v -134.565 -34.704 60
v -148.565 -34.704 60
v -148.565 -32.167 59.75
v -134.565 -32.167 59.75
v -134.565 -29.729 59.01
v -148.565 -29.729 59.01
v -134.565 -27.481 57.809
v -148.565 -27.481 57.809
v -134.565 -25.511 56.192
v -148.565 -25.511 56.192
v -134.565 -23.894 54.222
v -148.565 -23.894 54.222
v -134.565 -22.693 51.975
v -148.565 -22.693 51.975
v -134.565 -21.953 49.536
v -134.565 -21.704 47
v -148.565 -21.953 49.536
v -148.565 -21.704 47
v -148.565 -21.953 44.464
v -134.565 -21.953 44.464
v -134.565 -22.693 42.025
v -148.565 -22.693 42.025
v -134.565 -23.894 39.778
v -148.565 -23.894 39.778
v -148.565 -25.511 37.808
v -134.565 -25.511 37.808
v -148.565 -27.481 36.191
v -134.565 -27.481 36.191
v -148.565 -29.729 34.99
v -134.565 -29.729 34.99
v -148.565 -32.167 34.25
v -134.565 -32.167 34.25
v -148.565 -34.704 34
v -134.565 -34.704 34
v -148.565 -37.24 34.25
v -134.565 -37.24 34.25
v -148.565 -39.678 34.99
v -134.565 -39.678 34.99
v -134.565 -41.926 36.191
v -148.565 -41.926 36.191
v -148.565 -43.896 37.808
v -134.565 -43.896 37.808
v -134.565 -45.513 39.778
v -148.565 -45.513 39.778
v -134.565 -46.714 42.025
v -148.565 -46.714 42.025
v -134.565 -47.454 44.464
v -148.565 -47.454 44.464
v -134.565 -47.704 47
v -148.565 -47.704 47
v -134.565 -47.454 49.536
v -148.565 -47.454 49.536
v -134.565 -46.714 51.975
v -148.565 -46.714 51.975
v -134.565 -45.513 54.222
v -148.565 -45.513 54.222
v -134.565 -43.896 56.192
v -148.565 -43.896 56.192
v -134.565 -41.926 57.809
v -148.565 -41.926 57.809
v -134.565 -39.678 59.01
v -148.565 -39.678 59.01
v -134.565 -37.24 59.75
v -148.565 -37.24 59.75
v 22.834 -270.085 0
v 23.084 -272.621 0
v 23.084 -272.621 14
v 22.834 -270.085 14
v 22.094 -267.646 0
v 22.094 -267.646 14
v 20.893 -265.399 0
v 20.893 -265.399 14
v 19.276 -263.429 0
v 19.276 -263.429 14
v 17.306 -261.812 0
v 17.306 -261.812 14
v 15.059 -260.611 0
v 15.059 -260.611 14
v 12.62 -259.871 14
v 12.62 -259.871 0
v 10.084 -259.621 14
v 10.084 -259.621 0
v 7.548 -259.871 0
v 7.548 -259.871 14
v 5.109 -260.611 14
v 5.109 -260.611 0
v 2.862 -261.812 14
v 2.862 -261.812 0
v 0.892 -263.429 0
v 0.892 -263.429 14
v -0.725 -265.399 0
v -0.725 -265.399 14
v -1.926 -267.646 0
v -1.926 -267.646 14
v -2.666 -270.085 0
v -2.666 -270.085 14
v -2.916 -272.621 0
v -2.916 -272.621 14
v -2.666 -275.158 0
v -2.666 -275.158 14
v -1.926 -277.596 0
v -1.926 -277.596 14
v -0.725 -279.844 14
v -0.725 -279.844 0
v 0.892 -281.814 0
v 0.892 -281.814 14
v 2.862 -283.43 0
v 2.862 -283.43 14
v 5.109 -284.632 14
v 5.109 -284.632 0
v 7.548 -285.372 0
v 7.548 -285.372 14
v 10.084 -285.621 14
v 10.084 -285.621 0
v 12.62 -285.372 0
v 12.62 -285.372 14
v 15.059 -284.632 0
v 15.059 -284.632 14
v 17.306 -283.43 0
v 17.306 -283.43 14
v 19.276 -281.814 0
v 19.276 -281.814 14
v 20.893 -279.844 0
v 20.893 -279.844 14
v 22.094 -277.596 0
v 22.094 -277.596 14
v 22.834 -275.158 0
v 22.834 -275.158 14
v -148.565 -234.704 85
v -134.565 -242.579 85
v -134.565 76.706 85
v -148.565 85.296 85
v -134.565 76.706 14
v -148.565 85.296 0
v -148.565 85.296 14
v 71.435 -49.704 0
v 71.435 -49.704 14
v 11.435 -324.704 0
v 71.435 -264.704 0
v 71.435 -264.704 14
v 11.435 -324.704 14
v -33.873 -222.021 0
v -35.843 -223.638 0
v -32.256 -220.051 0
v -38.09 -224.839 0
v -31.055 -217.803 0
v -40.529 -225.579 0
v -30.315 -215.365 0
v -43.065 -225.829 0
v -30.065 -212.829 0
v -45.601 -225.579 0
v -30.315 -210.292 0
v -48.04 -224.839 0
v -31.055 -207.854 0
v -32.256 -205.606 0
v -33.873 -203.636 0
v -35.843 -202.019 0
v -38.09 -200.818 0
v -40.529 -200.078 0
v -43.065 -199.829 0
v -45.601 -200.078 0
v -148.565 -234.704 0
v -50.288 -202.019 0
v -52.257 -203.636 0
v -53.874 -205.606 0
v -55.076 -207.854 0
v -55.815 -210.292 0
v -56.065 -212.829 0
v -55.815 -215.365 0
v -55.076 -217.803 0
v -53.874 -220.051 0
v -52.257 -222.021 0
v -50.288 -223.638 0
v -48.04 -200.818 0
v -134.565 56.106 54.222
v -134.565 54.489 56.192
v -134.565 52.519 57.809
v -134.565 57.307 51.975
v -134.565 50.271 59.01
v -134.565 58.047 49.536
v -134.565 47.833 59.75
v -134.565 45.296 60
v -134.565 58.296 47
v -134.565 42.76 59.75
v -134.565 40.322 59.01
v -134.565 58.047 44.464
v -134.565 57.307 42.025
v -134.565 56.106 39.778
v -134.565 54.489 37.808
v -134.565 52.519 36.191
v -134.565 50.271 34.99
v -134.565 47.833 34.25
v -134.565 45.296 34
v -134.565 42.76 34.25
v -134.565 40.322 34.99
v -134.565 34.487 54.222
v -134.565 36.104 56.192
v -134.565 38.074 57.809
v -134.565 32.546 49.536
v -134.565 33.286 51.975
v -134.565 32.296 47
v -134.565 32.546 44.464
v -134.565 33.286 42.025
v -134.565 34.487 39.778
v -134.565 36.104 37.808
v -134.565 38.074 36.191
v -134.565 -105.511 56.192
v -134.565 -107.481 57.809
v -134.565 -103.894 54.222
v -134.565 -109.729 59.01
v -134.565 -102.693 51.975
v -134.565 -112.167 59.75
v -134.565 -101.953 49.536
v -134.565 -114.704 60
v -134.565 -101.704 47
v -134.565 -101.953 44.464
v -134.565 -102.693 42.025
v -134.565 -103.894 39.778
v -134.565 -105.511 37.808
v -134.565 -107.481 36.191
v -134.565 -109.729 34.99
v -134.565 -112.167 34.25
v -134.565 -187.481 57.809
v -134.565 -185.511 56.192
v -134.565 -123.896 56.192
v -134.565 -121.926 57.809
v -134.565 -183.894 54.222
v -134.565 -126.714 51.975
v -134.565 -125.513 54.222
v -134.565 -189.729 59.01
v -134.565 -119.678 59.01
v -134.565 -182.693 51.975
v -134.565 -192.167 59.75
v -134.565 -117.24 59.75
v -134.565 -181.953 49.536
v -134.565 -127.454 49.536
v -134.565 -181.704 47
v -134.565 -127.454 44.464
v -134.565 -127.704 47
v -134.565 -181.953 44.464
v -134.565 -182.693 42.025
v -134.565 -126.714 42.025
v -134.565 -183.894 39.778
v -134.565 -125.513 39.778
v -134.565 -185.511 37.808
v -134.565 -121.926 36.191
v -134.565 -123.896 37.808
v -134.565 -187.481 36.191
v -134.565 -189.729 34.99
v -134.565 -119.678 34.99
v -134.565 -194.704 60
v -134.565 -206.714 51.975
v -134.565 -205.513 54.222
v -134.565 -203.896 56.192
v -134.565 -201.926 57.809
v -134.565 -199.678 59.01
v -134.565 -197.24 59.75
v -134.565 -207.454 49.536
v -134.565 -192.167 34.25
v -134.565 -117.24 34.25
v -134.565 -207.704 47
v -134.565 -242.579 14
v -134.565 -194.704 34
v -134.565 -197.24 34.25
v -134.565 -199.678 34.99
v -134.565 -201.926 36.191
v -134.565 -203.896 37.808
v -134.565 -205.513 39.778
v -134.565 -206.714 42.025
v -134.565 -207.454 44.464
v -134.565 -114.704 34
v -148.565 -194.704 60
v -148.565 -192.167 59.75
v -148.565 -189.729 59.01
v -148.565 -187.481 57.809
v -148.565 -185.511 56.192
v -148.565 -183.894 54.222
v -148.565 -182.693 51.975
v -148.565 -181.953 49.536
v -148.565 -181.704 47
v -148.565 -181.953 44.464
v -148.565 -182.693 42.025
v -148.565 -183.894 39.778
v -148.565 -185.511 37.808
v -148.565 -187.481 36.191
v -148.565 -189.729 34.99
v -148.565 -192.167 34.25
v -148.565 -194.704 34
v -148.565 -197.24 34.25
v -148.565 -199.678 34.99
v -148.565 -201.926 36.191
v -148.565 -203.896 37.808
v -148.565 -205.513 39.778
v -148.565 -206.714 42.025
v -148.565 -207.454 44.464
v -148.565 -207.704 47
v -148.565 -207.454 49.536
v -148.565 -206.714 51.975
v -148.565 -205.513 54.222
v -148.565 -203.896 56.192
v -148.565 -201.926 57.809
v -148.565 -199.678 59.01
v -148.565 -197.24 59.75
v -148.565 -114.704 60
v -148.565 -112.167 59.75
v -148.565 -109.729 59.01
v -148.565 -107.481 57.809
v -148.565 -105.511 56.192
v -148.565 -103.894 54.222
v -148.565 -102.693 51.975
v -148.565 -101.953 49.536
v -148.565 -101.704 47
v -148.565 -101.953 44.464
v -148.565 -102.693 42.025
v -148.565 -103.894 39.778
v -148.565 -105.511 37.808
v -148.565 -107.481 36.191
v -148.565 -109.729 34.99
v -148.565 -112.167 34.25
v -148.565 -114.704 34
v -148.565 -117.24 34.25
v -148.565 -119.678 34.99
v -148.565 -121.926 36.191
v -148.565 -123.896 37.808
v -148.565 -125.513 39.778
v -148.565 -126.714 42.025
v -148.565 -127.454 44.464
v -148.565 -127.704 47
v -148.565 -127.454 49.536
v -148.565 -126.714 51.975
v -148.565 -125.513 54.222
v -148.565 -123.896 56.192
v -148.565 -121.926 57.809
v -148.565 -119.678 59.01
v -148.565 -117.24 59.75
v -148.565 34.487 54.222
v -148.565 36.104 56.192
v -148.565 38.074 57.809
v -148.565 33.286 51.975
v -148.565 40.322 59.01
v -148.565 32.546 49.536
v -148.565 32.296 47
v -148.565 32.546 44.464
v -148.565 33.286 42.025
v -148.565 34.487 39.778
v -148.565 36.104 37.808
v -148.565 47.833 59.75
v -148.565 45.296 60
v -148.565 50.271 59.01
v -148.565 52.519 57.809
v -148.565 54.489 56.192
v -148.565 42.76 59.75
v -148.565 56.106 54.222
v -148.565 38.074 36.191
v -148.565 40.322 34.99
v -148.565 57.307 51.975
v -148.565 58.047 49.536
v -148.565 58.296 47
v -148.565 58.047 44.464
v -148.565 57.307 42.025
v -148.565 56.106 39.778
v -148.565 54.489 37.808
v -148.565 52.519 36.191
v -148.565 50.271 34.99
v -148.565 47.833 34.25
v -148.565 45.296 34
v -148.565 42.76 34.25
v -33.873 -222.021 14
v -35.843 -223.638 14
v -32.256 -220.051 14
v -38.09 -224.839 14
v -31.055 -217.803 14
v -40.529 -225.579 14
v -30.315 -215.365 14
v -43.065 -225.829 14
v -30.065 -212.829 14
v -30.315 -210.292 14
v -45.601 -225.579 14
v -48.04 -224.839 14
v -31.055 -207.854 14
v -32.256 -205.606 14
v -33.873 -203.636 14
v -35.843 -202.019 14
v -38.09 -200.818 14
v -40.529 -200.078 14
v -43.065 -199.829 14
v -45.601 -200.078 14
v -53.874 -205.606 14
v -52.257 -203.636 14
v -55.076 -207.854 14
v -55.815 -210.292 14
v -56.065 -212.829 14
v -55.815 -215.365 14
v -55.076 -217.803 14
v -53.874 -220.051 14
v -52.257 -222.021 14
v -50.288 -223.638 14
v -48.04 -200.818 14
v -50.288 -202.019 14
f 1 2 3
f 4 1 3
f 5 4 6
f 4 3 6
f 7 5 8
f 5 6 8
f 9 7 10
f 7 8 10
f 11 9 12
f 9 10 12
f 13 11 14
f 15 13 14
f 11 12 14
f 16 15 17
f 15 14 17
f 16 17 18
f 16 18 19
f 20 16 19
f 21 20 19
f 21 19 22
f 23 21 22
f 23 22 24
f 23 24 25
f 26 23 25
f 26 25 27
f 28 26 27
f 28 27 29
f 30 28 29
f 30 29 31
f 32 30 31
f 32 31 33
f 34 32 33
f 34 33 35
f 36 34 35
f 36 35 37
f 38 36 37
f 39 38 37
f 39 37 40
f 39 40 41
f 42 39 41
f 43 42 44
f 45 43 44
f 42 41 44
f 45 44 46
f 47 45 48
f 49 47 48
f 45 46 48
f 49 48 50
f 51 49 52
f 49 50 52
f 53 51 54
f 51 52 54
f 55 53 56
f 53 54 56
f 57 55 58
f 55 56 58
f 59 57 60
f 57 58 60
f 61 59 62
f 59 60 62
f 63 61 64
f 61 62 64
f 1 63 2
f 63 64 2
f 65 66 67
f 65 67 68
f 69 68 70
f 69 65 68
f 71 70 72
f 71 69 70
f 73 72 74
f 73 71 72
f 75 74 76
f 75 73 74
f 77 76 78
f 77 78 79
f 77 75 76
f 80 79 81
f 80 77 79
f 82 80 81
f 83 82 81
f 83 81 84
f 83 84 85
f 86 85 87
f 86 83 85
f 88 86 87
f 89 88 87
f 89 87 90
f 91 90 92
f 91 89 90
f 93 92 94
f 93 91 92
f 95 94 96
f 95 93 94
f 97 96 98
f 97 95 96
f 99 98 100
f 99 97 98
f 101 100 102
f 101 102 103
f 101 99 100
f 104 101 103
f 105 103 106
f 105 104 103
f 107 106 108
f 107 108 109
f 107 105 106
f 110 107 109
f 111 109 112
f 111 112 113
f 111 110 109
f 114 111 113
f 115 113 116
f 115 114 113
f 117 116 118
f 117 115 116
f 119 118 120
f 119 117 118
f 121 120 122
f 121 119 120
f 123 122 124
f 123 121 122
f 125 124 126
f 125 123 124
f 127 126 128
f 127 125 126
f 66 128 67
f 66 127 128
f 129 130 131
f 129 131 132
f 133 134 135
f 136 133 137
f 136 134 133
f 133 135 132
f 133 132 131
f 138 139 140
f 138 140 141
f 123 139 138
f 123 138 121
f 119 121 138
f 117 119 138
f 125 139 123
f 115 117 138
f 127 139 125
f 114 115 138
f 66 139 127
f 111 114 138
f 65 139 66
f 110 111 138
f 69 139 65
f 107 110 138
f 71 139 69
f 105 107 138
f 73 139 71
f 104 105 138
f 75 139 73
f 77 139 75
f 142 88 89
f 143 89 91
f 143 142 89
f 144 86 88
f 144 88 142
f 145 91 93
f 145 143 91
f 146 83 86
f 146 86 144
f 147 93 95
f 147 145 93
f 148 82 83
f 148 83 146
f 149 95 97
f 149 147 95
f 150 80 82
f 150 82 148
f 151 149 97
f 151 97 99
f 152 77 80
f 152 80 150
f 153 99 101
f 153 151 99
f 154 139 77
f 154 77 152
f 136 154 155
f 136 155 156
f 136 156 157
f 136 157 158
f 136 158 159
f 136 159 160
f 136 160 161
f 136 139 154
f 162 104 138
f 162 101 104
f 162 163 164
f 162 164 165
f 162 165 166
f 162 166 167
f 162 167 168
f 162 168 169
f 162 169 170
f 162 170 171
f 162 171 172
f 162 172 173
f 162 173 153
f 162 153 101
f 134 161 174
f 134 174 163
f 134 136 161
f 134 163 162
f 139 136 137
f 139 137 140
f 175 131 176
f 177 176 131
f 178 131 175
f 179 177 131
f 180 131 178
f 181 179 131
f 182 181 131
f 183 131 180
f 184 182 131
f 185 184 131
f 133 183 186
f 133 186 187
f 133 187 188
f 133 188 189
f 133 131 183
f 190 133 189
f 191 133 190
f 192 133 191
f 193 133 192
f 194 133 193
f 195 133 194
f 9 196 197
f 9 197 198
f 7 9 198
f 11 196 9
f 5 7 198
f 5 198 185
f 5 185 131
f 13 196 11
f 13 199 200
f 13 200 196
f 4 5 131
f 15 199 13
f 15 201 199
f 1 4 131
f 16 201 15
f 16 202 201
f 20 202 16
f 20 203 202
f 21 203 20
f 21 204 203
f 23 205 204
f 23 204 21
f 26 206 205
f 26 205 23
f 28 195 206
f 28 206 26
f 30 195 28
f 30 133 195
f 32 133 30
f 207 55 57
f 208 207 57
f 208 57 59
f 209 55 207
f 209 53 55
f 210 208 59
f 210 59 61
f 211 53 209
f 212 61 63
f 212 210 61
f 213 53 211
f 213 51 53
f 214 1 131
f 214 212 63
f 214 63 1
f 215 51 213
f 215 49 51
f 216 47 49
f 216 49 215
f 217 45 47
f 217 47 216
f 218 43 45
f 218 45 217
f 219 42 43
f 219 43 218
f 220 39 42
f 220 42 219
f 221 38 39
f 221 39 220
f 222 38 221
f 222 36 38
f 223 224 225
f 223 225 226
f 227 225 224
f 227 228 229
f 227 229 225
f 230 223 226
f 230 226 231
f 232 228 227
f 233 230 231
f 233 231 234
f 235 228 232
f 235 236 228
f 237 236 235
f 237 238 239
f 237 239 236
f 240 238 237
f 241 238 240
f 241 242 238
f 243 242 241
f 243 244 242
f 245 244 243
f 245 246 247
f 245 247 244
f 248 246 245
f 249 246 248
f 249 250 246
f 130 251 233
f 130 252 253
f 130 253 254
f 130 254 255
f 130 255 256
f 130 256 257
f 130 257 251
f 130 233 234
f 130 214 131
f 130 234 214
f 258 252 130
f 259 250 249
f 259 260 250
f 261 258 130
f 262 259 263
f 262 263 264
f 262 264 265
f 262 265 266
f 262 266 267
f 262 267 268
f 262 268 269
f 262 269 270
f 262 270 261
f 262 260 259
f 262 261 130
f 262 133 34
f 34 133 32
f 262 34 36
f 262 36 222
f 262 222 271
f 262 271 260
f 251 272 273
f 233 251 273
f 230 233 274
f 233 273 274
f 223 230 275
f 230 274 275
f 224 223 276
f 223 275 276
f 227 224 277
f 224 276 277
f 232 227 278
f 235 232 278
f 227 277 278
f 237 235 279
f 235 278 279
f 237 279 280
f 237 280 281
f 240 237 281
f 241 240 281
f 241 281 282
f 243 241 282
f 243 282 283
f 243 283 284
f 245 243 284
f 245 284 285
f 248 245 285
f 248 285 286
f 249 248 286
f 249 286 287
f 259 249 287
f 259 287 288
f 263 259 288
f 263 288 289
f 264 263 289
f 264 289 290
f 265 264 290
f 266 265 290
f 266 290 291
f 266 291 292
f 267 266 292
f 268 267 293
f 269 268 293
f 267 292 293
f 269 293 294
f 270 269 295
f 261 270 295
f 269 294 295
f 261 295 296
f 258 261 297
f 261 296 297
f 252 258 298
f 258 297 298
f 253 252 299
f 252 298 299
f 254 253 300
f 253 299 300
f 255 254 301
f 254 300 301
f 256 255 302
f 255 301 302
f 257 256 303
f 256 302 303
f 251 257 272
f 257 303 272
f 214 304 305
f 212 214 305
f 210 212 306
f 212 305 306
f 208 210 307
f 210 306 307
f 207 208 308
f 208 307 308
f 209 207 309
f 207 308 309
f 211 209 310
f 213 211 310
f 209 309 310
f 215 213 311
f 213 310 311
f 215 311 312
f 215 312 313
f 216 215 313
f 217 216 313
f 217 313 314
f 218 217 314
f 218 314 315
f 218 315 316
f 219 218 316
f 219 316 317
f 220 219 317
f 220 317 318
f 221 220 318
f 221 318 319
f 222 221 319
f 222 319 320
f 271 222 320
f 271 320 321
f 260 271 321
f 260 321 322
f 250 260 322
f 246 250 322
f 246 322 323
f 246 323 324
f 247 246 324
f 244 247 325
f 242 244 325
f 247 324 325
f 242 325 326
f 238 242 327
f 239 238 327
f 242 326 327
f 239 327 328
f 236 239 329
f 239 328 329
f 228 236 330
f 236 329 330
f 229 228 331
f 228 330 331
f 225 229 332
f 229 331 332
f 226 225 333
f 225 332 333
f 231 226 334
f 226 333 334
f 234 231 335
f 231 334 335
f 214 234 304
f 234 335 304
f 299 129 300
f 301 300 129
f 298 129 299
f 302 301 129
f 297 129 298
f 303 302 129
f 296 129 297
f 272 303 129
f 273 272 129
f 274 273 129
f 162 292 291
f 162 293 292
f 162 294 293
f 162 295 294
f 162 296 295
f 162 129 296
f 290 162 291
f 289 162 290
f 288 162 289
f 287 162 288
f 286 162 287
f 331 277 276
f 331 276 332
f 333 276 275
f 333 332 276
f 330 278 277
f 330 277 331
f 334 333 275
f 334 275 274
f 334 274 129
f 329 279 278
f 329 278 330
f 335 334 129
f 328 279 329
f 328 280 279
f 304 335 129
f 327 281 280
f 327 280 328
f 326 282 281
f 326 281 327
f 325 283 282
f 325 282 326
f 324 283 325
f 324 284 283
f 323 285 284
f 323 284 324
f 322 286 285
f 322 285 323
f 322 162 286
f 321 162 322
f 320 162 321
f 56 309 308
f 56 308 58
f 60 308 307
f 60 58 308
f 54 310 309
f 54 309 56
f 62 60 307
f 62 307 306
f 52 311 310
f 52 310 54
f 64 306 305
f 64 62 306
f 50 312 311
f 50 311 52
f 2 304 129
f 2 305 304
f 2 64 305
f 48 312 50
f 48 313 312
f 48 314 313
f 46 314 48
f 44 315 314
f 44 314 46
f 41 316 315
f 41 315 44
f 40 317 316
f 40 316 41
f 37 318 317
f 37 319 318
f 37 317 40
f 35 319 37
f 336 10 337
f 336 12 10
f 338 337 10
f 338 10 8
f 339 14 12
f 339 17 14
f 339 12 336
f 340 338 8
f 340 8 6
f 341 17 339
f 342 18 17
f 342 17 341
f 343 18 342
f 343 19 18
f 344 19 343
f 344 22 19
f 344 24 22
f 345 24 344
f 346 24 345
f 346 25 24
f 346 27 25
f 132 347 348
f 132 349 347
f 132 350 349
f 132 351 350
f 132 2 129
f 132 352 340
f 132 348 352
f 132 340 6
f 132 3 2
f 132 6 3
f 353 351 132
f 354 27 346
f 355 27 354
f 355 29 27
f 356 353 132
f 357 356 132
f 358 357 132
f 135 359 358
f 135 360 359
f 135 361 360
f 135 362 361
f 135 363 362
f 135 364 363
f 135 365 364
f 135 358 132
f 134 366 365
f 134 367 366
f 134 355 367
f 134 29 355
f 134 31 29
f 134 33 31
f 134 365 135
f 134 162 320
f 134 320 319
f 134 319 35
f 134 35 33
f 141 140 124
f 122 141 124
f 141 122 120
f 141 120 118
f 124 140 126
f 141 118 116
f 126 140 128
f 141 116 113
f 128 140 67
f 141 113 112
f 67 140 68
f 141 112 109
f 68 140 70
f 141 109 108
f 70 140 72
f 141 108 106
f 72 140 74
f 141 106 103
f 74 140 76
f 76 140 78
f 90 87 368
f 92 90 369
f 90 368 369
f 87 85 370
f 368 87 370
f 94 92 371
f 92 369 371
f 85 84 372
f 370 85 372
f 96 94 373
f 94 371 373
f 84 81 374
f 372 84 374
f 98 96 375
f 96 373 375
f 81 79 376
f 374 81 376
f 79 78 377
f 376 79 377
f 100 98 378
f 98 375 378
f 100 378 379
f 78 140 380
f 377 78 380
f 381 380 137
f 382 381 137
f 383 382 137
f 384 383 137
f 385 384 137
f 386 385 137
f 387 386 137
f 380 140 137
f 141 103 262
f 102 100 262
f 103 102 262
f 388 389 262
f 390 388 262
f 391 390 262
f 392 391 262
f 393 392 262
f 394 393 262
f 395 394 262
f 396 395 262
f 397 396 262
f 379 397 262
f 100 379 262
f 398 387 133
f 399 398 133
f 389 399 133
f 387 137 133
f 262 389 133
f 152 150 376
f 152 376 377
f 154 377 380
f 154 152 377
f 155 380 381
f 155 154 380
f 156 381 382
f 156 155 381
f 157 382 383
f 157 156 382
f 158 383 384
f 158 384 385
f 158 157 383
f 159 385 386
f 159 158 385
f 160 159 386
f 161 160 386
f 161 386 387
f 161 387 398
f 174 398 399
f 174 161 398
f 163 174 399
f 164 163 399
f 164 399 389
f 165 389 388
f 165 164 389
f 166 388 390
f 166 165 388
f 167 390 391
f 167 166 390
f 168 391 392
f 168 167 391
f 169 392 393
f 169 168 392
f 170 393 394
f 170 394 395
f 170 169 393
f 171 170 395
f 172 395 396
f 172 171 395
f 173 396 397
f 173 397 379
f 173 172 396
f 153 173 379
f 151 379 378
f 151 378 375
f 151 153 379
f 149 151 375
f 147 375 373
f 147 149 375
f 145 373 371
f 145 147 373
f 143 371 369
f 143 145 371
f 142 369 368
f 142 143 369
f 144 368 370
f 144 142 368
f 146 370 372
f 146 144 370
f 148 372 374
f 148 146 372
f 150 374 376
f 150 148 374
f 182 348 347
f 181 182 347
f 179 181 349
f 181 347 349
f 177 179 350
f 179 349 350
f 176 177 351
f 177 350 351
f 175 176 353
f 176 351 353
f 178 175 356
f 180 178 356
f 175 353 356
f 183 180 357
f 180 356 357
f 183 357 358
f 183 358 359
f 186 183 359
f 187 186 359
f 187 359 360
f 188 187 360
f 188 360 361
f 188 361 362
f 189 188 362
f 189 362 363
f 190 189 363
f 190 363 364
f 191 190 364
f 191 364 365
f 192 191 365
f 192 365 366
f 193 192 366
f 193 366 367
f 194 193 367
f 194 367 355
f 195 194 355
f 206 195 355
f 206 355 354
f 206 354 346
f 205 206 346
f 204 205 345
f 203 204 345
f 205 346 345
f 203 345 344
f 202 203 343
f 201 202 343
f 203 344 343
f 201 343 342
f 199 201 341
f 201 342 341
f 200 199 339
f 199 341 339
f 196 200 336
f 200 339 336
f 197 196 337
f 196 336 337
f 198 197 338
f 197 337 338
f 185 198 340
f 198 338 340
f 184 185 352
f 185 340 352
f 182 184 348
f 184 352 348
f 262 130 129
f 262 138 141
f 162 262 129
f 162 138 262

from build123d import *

# Parameters (mm, degrees)
SKETCH_1_R             = 13
EXTRUDE_1_DEPTH        = 14
EXTRUDE_2_DEPTH        = 71
SKETCH_3_R             = 13
CUT_EXTRUDE_1_DEPTH    = 402.319595452
PATTERN_LINEAR_1_COUNT = 4
PATTERN_LINEAR_1_PITCH = 80


with BuildPart() as part:
    # 草图1 → 凸台-拉伸1 (new body)
    with BuildSketch(Plane.XY):
        Polygon((71.4349048, -49.703584356), (71.4349048, -264.703584356), (11.4349048, -324.703584356), (-148.5650952, -234.703584356), (-148.5650952, 85.296415644), align=None)
        with Locations((-43.0650952, -212.828584356)):
            Circle(SKETCH_1_R, mode=Mode.SUBTRACT)
        with Locations((10.084011906, -272.621329851)):
            Circle(SKETCH_1_R, mode=Mode.SUBTRACT)
    extrude(amount=EXTRUDE_1_DEPTH)

    # 草图2 → 凸台-拉伸2 (add)
    with BuildSketch(Plane.XY.offset(14)):
        Polygon((-134.5650952, 76.705506553), (-134.5650952, -242.578584356), (-148.5650952, -234.703584356), (-148.5650952, 85.296415644), align=None)
    extrude(amount=EXTRUDE_2_DEPTH)

    # 草图3 → 切除-拉伸1 (cut, through all)
    with BuildSketch(Plane.ZY.offset(148.5650952)):
        with Locations((47, 45.296415644)):
            Circle(SKETCH_3_R)
    cut_extrude_1 = extrude(amount=-CUT_EXTRUDE_1_DEPTH, mode=Mode.SUBTRACT)

    # 阵列(线性)1: 切除-拉伸1 ×4
    with Locations(*[(0, -i * PATTERN_LINEAR_1_PITCH, 0) for i in range(1, PATTERN_LINEAR_1_COUNT)]):
        add(cut_extrude_1, mode=Mode.SUBTRACT)


solid = part.part
